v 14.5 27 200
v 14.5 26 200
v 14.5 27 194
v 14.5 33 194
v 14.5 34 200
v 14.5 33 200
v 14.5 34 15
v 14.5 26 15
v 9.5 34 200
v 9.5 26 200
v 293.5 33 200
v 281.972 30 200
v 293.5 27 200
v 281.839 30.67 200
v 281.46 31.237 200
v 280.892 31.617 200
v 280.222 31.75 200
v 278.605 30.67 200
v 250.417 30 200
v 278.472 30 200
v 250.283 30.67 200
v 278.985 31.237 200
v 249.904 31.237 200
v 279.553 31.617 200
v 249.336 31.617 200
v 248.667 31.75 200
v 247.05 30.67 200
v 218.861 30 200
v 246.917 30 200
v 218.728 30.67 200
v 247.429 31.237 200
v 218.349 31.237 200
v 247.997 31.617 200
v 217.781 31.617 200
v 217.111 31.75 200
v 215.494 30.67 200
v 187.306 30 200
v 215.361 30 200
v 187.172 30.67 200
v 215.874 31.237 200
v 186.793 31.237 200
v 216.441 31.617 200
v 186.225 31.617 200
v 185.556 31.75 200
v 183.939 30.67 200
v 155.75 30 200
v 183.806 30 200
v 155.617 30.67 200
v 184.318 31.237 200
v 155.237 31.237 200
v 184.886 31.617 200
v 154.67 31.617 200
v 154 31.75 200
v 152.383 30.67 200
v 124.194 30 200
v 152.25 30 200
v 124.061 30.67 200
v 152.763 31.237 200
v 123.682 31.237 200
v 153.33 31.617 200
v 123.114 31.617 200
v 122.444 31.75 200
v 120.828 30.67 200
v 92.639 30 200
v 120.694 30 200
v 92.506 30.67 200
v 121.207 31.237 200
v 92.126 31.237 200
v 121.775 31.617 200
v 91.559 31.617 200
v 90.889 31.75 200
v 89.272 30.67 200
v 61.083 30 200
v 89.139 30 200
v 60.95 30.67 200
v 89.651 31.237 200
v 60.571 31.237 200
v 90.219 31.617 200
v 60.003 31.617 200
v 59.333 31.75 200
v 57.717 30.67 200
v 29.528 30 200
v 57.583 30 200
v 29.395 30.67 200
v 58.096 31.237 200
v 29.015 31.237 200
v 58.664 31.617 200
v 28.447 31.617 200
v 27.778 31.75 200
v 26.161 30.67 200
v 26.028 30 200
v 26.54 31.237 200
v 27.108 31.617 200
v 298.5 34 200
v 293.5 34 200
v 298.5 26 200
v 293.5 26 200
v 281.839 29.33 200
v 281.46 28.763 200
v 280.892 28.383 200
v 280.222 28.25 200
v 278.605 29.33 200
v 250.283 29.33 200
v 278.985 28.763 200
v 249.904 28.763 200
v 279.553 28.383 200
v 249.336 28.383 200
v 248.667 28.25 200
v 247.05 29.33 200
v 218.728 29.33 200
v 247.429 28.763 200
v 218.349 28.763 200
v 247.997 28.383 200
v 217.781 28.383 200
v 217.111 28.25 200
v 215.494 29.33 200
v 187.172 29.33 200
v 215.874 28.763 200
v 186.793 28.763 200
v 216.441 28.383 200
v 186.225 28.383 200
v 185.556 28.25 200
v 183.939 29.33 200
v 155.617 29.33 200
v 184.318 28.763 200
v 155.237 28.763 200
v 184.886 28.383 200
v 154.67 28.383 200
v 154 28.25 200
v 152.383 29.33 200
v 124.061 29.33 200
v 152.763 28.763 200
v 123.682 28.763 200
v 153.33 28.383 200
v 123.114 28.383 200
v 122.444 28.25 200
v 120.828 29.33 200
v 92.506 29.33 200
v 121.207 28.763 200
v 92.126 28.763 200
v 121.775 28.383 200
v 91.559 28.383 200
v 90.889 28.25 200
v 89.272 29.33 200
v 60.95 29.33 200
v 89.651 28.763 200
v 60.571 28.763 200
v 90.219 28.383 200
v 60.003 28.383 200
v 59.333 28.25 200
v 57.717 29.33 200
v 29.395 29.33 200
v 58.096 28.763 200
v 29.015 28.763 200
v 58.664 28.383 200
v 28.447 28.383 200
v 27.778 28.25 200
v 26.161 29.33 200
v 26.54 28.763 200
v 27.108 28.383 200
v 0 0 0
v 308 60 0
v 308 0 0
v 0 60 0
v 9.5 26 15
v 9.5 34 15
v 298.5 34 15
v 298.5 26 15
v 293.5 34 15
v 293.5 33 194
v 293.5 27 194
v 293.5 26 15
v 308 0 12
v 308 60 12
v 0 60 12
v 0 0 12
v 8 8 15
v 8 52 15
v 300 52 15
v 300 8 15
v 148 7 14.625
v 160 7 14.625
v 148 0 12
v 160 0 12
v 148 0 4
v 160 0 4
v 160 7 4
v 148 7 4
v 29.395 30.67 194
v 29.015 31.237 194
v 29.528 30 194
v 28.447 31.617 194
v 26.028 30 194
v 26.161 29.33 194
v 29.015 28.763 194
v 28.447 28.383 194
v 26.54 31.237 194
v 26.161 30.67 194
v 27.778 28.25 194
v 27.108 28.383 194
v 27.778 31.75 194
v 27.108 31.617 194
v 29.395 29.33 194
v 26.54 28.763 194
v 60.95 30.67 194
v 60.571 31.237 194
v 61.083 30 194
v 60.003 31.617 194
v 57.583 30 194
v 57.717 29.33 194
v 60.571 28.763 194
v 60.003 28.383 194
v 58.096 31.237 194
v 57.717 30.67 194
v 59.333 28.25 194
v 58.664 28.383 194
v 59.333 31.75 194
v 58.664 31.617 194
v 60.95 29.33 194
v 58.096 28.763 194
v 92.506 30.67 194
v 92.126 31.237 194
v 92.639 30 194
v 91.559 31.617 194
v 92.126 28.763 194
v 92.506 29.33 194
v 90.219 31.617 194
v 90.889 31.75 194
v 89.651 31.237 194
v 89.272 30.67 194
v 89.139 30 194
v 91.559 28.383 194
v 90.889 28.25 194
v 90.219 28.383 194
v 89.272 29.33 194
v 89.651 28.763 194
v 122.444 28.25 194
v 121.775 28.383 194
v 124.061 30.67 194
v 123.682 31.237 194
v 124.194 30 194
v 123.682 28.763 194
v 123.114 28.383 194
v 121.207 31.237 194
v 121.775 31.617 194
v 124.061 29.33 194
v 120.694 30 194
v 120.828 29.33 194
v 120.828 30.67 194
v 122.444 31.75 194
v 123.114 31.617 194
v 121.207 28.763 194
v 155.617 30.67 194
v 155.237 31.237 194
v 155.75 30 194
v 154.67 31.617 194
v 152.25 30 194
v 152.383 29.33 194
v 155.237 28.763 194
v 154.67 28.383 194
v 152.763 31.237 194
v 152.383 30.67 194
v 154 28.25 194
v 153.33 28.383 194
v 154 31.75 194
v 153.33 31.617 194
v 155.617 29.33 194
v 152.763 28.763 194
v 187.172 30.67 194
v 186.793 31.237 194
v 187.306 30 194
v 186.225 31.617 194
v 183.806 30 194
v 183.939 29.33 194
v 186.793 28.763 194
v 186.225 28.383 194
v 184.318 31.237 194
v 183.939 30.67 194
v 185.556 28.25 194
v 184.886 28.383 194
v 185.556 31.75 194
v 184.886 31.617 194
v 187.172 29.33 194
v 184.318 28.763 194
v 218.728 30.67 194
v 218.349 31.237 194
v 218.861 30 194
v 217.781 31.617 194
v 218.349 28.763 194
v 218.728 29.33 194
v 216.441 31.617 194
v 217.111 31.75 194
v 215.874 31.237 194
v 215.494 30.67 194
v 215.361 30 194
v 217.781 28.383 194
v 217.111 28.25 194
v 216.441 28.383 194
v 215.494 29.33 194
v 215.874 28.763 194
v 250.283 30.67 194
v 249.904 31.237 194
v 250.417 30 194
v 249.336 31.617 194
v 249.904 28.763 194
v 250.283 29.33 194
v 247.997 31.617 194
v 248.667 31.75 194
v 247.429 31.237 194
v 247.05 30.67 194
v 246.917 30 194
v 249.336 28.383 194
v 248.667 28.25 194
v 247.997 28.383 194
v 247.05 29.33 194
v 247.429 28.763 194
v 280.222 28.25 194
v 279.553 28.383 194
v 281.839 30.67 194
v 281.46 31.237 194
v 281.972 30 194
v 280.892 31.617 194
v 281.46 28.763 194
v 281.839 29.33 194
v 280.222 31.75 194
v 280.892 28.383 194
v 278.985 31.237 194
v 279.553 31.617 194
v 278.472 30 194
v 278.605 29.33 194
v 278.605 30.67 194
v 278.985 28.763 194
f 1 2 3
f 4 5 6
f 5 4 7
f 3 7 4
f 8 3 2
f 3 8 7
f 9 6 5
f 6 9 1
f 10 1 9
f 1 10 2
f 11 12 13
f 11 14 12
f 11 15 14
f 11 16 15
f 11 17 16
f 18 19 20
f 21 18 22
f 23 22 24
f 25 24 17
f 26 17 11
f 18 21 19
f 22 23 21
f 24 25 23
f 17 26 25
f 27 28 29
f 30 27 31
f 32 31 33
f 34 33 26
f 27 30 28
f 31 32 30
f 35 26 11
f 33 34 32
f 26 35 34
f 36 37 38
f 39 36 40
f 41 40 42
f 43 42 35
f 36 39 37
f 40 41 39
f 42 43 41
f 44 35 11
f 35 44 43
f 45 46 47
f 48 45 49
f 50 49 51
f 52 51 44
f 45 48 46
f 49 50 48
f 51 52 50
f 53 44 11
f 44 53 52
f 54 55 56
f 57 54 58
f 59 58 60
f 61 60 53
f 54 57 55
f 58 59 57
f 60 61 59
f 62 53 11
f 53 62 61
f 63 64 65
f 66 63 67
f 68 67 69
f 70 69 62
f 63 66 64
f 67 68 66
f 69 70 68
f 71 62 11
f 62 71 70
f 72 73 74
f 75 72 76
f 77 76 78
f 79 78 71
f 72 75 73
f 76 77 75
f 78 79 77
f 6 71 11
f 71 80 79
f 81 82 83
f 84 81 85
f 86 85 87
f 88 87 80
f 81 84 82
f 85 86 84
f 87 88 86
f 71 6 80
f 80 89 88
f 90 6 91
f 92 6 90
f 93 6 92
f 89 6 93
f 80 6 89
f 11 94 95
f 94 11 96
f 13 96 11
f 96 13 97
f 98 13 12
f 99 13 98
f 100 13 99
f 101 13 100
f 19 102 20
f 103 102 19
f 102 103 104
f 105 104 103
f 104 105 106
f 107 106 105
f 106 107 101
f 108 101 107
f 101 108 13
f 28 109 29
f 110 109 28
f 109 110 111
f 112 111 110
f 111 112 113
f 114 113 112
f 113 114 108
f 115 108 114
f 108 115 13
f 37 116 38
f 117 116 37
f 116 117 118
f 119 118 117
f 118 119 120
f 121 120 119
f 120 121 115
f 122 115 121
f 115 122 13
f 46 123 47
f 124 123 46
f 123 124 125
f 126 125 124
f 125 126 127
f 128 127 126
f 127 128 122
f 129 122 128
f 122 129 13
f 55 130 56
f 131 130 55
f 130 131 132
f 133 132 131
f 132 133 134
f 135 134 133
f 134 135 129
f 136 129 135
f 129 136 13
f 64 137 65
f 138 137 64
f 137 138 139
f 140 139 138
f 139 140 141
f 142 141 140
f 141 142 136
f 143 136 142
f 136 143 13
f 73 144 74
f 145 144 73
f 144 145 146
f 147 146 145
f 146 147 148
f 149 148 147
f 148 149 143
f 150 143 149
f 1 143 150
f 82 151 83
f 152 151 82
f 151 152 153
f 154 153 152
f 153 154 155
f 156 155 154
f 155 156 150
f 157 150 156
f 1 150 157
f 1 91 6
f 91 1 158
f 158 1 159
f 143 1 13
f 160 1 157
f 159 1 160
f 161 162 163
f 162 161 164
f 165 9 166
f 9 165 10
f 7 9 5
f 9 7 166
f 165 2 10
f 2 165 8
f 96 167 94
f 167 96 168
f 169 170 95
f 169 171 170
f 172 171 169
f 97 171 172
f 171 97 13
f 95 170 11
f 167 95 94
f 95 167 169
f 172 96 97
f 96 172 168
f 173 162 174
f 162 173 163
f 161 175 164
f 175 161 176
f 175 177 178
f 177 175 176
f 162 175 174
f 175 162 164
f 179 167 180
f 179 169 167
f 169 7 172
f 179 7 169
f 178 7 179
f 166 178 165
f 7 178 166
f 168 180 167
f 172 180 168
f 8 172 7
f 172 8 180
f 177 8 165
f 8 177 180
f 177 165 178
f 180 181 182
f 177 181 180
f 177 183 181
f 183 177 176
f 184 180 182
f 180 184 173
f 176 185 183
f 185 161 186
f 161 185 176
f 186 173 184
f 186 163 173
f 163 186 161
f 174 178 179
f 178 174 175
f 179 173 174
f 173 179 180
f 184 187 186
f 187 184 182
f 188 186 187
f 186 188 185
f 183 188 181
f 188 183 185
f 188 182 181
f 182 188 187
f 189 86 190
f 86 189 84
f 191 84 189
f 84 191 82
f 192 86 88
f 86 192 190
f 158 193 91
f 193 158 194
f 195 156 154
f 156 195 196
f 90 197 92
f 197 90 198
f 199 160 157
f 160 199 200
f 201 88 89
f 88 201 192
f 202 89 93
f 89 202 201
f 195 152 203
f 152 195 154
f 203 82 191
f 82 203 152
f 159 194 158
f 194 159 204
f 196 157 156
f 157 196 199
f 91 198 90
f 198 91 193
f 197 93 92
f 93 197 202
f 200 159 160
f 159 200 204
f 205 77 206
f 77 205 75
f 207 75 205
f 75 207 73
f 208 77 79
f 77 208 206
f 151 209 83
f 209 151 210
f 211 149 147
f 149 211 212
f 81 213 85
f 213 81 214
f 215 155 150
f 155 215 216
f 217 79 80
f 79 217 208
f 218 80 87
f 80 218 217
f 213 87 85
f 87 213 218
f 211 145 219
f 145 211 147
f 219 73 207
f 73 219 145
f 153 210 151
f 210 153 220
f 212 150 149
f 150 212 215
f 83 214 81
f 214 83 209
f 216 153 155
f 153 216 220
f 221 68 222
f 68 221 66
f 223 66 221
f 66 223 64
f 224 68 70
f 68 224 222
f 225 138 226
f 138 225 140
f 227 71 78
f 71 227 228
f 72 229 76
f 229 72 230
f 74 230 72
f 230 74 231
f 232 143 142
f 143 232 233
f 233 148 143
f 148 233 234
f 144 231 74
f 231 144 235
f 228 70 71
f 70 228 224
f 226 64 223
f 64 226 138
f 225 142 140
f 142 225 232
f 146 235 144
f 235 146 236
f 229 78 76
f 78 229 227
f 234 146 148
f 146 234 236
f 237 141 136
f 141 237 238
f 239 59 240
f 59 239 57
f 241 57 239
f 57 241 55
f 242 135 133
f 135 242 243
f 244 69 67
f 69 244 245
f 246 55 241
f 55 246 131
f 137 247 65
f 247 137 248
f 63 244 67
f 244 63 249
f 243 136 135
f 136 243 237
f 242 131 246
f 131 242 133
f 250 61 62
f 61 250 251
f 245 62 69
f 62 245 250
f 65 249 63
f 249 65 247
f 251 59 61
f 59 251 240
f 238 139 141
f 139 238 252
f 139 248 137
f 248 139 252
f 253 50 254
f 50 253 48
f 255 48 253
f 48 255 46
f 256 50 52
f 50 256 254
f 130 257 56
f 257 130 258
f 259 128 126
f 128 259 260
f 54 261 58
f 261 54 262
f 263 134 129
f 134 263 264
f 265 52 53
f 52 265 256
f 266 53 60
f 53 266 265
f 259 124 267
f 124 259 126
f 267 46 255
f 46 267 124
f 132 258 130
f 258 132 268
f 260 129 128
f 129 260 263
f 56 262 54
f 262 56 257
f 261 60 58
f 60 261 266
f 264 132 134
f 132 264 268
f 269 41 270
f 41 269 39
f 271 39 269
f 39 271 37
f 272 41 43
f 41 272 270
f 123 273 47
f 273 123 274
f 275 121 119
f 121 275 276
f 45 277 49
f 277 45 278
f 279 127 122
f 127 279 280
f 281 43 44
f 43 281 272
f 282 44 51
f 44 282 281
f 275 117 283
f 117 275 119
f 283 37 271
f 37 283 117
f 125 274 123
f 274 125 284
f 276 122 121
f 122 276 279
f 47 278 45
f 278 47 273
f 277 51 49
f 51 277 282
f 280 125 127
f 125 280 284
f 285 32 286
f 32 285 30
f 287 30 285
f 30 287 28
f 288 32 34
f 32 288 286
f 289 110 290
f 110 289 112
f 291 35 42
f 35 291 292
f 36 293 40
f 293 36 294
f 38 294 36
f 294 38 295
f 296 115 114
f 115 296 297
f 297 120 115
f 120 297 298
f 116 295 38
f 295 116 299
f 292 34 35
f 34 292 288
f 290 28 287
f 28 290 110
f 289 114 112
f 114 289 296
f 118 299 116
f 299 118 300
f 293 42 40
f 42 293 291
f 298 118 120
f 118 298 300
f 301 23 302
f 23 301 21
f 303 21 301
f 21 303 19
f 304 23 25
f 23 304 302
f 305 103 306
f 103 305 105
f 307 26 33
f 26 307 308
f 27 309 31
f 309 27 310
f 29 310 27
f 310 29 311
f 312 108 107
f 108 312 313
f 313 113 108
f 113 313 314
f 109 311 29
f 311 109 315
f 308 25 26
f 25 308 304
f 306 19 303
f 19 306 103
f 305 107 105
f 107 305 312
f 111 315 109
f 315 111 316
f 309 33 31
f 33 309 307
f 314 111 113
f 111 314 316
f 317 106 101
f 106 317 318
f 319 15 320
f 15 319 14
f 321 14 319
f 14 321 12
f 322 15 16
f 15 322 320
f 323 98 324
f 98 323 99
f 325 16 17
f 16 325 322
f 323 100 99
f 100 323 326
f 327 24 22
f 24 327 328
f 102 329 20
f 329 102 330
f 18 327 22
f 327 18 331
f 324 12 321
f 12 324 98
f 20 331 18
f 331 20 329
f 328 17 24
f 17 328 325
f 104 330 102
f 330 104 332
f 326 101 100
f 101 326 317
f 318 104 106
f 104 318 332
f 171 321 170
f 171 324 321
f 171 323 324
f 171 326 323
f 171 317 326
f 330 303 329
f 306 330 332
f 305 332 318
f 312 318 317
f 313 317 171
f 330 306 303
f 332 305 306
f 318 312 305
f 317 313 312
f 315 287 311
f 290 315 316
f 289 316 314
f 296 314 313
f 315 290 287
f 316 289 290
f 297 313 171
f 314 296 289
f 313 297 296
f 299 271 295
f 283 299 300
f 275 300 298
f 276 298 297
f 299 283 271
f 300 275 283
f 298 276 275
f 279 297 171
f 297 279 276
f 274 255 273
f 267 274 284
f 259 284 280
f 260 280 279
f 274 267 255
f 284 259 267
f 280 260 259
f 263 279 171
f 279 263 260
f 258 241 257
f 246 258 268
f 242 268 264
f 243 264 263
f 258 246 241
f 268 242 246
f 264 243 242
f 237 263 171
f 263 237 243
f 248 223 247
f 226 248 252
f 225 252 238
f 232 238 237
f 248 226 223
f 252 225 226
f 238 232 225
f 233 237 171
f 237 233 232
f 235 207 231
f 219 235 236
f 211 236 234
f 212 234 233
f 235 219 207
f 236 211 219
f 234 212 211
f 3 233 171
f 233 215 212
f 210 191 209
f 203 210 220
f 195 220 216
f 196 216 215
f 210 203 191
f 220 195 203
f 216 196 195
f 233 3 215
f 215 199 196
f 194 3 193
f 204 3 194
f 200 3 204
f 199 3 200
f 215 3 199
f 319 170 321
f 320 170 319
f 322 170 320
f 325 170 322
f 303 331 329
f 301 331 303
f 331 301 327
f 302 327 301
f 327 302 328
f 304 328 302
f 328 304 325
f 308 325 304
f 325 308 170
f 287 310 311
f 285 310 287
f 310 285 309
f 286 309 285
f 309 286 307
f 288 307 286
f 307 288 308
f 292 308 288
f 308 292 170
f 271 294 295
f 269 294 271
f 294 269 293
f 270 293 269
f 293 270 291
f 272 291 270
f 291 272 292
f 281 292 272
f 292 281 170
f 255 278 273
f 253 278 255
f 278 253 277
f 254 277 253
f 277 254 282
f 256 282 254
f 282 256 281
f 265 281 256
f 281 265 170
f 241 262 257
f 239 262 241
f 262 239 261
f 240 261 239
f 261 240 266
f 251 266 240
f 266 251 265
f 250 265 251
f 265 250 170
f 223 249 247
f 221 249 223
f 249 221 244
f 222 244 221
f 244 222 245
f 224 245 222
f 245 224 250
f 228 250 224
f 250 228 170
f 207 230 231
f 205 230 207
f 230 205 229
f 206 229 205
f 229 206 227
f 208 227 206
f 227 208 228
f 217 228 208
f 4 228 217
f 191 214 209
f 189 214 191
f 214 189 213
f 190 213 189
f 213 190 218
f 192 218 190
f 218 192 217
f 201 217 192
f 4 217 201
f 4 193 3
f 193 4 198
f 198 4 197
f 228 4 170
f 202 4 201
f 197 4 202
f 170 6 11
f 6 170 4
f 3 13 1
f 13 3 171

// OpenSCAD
// Perpetual Wave Desk Toy — Newton's Wave (Kinetic)
// 9 hanging spheres on angled arms, hypnotic wave motion
// DUAL COLOR: frame (dark) + spheres (accent)
// PLA/PETG — 0.2mm, 4 walls, 20% infill
// Hardware: 9x M3 eyebolts + fishing line

BALLS      = 9;
BALL_D     = 28;
SPACING    = BALL_D + 4;
ARM_H      = 160;
ARM_W      = 8;
ARM_T      = 5;
BASE_W     = BALLS * SPACING + 20;
BASE_D     = 60;
BASE_H     = 12;
FRAME_H    = 200;
CROSS_T    = 6;
EYEBOLT_D  = 3.5;  // M3 eyebolt hole

module base() {
    difference() {
        union() {
            // Weighted base (thick for stability)
            hull() {
                cube([BASE_W, BASE_D, BASE_H]);
                translate([8, 8, BASE_H])
                    cube([BASE_W - 16, BASE_D - 16, 3]);
            }
            // Upright posts
            for (x = [12, BASE_W - 12])
                translate([x - ARM_T/2, BASE_D/2 - ARM_W/2, 0])
                    cube([ARM_T, ARM_W, FRAME_H]);
        }
        // Cable management slot
        translate([BASE_W/2 - 6, -1, 4])
            cube([12, 8, BASE_H]);
    }
}

module crossbar() {
    // Top horizontal bar connecting both posts
    translate([12, BASE_D/2 - CROSS_T/2, FRAME_H - CROSS_T])
        difference() {
            cube([BASE_W - 24, CROSS_T, CROSS_T]);
            // Eyebolt holes for each ball position
            for (i = [0 : BALLS - 1]) {
                x = (BASE_W - 24) * (i + 0.5) / BALLS;
                translate([x, CROSS_T/2, -1])
                    cylinder(d = EYEBOLT_D, h = CROSS_T + 2, $fn = 16);
            }
        }
}

module sphere_set() {
    // Spheres (Color 2) — print separately
    for (i = [0 : BALLS - 1])
        translate([12 + i * SPACING + SPACING/2, BASE_D/2, FRAME_H * 0.35])
            difference() {
                sphere(d = BALL_D, $fn = 32);
                // Eyebolt hole through top
                translate([0, 0, BALL_D/2 - 4])
                    cylinder(d = EYEBOLT_D, h = 8, $fn = 16);
            }
}

// Color 1: Frame
base();
crossbar();

// Color 2: Spheres (save as separate file for AMS)
// translate([BASE_W + 30, 0, 0]) sphere_set();
